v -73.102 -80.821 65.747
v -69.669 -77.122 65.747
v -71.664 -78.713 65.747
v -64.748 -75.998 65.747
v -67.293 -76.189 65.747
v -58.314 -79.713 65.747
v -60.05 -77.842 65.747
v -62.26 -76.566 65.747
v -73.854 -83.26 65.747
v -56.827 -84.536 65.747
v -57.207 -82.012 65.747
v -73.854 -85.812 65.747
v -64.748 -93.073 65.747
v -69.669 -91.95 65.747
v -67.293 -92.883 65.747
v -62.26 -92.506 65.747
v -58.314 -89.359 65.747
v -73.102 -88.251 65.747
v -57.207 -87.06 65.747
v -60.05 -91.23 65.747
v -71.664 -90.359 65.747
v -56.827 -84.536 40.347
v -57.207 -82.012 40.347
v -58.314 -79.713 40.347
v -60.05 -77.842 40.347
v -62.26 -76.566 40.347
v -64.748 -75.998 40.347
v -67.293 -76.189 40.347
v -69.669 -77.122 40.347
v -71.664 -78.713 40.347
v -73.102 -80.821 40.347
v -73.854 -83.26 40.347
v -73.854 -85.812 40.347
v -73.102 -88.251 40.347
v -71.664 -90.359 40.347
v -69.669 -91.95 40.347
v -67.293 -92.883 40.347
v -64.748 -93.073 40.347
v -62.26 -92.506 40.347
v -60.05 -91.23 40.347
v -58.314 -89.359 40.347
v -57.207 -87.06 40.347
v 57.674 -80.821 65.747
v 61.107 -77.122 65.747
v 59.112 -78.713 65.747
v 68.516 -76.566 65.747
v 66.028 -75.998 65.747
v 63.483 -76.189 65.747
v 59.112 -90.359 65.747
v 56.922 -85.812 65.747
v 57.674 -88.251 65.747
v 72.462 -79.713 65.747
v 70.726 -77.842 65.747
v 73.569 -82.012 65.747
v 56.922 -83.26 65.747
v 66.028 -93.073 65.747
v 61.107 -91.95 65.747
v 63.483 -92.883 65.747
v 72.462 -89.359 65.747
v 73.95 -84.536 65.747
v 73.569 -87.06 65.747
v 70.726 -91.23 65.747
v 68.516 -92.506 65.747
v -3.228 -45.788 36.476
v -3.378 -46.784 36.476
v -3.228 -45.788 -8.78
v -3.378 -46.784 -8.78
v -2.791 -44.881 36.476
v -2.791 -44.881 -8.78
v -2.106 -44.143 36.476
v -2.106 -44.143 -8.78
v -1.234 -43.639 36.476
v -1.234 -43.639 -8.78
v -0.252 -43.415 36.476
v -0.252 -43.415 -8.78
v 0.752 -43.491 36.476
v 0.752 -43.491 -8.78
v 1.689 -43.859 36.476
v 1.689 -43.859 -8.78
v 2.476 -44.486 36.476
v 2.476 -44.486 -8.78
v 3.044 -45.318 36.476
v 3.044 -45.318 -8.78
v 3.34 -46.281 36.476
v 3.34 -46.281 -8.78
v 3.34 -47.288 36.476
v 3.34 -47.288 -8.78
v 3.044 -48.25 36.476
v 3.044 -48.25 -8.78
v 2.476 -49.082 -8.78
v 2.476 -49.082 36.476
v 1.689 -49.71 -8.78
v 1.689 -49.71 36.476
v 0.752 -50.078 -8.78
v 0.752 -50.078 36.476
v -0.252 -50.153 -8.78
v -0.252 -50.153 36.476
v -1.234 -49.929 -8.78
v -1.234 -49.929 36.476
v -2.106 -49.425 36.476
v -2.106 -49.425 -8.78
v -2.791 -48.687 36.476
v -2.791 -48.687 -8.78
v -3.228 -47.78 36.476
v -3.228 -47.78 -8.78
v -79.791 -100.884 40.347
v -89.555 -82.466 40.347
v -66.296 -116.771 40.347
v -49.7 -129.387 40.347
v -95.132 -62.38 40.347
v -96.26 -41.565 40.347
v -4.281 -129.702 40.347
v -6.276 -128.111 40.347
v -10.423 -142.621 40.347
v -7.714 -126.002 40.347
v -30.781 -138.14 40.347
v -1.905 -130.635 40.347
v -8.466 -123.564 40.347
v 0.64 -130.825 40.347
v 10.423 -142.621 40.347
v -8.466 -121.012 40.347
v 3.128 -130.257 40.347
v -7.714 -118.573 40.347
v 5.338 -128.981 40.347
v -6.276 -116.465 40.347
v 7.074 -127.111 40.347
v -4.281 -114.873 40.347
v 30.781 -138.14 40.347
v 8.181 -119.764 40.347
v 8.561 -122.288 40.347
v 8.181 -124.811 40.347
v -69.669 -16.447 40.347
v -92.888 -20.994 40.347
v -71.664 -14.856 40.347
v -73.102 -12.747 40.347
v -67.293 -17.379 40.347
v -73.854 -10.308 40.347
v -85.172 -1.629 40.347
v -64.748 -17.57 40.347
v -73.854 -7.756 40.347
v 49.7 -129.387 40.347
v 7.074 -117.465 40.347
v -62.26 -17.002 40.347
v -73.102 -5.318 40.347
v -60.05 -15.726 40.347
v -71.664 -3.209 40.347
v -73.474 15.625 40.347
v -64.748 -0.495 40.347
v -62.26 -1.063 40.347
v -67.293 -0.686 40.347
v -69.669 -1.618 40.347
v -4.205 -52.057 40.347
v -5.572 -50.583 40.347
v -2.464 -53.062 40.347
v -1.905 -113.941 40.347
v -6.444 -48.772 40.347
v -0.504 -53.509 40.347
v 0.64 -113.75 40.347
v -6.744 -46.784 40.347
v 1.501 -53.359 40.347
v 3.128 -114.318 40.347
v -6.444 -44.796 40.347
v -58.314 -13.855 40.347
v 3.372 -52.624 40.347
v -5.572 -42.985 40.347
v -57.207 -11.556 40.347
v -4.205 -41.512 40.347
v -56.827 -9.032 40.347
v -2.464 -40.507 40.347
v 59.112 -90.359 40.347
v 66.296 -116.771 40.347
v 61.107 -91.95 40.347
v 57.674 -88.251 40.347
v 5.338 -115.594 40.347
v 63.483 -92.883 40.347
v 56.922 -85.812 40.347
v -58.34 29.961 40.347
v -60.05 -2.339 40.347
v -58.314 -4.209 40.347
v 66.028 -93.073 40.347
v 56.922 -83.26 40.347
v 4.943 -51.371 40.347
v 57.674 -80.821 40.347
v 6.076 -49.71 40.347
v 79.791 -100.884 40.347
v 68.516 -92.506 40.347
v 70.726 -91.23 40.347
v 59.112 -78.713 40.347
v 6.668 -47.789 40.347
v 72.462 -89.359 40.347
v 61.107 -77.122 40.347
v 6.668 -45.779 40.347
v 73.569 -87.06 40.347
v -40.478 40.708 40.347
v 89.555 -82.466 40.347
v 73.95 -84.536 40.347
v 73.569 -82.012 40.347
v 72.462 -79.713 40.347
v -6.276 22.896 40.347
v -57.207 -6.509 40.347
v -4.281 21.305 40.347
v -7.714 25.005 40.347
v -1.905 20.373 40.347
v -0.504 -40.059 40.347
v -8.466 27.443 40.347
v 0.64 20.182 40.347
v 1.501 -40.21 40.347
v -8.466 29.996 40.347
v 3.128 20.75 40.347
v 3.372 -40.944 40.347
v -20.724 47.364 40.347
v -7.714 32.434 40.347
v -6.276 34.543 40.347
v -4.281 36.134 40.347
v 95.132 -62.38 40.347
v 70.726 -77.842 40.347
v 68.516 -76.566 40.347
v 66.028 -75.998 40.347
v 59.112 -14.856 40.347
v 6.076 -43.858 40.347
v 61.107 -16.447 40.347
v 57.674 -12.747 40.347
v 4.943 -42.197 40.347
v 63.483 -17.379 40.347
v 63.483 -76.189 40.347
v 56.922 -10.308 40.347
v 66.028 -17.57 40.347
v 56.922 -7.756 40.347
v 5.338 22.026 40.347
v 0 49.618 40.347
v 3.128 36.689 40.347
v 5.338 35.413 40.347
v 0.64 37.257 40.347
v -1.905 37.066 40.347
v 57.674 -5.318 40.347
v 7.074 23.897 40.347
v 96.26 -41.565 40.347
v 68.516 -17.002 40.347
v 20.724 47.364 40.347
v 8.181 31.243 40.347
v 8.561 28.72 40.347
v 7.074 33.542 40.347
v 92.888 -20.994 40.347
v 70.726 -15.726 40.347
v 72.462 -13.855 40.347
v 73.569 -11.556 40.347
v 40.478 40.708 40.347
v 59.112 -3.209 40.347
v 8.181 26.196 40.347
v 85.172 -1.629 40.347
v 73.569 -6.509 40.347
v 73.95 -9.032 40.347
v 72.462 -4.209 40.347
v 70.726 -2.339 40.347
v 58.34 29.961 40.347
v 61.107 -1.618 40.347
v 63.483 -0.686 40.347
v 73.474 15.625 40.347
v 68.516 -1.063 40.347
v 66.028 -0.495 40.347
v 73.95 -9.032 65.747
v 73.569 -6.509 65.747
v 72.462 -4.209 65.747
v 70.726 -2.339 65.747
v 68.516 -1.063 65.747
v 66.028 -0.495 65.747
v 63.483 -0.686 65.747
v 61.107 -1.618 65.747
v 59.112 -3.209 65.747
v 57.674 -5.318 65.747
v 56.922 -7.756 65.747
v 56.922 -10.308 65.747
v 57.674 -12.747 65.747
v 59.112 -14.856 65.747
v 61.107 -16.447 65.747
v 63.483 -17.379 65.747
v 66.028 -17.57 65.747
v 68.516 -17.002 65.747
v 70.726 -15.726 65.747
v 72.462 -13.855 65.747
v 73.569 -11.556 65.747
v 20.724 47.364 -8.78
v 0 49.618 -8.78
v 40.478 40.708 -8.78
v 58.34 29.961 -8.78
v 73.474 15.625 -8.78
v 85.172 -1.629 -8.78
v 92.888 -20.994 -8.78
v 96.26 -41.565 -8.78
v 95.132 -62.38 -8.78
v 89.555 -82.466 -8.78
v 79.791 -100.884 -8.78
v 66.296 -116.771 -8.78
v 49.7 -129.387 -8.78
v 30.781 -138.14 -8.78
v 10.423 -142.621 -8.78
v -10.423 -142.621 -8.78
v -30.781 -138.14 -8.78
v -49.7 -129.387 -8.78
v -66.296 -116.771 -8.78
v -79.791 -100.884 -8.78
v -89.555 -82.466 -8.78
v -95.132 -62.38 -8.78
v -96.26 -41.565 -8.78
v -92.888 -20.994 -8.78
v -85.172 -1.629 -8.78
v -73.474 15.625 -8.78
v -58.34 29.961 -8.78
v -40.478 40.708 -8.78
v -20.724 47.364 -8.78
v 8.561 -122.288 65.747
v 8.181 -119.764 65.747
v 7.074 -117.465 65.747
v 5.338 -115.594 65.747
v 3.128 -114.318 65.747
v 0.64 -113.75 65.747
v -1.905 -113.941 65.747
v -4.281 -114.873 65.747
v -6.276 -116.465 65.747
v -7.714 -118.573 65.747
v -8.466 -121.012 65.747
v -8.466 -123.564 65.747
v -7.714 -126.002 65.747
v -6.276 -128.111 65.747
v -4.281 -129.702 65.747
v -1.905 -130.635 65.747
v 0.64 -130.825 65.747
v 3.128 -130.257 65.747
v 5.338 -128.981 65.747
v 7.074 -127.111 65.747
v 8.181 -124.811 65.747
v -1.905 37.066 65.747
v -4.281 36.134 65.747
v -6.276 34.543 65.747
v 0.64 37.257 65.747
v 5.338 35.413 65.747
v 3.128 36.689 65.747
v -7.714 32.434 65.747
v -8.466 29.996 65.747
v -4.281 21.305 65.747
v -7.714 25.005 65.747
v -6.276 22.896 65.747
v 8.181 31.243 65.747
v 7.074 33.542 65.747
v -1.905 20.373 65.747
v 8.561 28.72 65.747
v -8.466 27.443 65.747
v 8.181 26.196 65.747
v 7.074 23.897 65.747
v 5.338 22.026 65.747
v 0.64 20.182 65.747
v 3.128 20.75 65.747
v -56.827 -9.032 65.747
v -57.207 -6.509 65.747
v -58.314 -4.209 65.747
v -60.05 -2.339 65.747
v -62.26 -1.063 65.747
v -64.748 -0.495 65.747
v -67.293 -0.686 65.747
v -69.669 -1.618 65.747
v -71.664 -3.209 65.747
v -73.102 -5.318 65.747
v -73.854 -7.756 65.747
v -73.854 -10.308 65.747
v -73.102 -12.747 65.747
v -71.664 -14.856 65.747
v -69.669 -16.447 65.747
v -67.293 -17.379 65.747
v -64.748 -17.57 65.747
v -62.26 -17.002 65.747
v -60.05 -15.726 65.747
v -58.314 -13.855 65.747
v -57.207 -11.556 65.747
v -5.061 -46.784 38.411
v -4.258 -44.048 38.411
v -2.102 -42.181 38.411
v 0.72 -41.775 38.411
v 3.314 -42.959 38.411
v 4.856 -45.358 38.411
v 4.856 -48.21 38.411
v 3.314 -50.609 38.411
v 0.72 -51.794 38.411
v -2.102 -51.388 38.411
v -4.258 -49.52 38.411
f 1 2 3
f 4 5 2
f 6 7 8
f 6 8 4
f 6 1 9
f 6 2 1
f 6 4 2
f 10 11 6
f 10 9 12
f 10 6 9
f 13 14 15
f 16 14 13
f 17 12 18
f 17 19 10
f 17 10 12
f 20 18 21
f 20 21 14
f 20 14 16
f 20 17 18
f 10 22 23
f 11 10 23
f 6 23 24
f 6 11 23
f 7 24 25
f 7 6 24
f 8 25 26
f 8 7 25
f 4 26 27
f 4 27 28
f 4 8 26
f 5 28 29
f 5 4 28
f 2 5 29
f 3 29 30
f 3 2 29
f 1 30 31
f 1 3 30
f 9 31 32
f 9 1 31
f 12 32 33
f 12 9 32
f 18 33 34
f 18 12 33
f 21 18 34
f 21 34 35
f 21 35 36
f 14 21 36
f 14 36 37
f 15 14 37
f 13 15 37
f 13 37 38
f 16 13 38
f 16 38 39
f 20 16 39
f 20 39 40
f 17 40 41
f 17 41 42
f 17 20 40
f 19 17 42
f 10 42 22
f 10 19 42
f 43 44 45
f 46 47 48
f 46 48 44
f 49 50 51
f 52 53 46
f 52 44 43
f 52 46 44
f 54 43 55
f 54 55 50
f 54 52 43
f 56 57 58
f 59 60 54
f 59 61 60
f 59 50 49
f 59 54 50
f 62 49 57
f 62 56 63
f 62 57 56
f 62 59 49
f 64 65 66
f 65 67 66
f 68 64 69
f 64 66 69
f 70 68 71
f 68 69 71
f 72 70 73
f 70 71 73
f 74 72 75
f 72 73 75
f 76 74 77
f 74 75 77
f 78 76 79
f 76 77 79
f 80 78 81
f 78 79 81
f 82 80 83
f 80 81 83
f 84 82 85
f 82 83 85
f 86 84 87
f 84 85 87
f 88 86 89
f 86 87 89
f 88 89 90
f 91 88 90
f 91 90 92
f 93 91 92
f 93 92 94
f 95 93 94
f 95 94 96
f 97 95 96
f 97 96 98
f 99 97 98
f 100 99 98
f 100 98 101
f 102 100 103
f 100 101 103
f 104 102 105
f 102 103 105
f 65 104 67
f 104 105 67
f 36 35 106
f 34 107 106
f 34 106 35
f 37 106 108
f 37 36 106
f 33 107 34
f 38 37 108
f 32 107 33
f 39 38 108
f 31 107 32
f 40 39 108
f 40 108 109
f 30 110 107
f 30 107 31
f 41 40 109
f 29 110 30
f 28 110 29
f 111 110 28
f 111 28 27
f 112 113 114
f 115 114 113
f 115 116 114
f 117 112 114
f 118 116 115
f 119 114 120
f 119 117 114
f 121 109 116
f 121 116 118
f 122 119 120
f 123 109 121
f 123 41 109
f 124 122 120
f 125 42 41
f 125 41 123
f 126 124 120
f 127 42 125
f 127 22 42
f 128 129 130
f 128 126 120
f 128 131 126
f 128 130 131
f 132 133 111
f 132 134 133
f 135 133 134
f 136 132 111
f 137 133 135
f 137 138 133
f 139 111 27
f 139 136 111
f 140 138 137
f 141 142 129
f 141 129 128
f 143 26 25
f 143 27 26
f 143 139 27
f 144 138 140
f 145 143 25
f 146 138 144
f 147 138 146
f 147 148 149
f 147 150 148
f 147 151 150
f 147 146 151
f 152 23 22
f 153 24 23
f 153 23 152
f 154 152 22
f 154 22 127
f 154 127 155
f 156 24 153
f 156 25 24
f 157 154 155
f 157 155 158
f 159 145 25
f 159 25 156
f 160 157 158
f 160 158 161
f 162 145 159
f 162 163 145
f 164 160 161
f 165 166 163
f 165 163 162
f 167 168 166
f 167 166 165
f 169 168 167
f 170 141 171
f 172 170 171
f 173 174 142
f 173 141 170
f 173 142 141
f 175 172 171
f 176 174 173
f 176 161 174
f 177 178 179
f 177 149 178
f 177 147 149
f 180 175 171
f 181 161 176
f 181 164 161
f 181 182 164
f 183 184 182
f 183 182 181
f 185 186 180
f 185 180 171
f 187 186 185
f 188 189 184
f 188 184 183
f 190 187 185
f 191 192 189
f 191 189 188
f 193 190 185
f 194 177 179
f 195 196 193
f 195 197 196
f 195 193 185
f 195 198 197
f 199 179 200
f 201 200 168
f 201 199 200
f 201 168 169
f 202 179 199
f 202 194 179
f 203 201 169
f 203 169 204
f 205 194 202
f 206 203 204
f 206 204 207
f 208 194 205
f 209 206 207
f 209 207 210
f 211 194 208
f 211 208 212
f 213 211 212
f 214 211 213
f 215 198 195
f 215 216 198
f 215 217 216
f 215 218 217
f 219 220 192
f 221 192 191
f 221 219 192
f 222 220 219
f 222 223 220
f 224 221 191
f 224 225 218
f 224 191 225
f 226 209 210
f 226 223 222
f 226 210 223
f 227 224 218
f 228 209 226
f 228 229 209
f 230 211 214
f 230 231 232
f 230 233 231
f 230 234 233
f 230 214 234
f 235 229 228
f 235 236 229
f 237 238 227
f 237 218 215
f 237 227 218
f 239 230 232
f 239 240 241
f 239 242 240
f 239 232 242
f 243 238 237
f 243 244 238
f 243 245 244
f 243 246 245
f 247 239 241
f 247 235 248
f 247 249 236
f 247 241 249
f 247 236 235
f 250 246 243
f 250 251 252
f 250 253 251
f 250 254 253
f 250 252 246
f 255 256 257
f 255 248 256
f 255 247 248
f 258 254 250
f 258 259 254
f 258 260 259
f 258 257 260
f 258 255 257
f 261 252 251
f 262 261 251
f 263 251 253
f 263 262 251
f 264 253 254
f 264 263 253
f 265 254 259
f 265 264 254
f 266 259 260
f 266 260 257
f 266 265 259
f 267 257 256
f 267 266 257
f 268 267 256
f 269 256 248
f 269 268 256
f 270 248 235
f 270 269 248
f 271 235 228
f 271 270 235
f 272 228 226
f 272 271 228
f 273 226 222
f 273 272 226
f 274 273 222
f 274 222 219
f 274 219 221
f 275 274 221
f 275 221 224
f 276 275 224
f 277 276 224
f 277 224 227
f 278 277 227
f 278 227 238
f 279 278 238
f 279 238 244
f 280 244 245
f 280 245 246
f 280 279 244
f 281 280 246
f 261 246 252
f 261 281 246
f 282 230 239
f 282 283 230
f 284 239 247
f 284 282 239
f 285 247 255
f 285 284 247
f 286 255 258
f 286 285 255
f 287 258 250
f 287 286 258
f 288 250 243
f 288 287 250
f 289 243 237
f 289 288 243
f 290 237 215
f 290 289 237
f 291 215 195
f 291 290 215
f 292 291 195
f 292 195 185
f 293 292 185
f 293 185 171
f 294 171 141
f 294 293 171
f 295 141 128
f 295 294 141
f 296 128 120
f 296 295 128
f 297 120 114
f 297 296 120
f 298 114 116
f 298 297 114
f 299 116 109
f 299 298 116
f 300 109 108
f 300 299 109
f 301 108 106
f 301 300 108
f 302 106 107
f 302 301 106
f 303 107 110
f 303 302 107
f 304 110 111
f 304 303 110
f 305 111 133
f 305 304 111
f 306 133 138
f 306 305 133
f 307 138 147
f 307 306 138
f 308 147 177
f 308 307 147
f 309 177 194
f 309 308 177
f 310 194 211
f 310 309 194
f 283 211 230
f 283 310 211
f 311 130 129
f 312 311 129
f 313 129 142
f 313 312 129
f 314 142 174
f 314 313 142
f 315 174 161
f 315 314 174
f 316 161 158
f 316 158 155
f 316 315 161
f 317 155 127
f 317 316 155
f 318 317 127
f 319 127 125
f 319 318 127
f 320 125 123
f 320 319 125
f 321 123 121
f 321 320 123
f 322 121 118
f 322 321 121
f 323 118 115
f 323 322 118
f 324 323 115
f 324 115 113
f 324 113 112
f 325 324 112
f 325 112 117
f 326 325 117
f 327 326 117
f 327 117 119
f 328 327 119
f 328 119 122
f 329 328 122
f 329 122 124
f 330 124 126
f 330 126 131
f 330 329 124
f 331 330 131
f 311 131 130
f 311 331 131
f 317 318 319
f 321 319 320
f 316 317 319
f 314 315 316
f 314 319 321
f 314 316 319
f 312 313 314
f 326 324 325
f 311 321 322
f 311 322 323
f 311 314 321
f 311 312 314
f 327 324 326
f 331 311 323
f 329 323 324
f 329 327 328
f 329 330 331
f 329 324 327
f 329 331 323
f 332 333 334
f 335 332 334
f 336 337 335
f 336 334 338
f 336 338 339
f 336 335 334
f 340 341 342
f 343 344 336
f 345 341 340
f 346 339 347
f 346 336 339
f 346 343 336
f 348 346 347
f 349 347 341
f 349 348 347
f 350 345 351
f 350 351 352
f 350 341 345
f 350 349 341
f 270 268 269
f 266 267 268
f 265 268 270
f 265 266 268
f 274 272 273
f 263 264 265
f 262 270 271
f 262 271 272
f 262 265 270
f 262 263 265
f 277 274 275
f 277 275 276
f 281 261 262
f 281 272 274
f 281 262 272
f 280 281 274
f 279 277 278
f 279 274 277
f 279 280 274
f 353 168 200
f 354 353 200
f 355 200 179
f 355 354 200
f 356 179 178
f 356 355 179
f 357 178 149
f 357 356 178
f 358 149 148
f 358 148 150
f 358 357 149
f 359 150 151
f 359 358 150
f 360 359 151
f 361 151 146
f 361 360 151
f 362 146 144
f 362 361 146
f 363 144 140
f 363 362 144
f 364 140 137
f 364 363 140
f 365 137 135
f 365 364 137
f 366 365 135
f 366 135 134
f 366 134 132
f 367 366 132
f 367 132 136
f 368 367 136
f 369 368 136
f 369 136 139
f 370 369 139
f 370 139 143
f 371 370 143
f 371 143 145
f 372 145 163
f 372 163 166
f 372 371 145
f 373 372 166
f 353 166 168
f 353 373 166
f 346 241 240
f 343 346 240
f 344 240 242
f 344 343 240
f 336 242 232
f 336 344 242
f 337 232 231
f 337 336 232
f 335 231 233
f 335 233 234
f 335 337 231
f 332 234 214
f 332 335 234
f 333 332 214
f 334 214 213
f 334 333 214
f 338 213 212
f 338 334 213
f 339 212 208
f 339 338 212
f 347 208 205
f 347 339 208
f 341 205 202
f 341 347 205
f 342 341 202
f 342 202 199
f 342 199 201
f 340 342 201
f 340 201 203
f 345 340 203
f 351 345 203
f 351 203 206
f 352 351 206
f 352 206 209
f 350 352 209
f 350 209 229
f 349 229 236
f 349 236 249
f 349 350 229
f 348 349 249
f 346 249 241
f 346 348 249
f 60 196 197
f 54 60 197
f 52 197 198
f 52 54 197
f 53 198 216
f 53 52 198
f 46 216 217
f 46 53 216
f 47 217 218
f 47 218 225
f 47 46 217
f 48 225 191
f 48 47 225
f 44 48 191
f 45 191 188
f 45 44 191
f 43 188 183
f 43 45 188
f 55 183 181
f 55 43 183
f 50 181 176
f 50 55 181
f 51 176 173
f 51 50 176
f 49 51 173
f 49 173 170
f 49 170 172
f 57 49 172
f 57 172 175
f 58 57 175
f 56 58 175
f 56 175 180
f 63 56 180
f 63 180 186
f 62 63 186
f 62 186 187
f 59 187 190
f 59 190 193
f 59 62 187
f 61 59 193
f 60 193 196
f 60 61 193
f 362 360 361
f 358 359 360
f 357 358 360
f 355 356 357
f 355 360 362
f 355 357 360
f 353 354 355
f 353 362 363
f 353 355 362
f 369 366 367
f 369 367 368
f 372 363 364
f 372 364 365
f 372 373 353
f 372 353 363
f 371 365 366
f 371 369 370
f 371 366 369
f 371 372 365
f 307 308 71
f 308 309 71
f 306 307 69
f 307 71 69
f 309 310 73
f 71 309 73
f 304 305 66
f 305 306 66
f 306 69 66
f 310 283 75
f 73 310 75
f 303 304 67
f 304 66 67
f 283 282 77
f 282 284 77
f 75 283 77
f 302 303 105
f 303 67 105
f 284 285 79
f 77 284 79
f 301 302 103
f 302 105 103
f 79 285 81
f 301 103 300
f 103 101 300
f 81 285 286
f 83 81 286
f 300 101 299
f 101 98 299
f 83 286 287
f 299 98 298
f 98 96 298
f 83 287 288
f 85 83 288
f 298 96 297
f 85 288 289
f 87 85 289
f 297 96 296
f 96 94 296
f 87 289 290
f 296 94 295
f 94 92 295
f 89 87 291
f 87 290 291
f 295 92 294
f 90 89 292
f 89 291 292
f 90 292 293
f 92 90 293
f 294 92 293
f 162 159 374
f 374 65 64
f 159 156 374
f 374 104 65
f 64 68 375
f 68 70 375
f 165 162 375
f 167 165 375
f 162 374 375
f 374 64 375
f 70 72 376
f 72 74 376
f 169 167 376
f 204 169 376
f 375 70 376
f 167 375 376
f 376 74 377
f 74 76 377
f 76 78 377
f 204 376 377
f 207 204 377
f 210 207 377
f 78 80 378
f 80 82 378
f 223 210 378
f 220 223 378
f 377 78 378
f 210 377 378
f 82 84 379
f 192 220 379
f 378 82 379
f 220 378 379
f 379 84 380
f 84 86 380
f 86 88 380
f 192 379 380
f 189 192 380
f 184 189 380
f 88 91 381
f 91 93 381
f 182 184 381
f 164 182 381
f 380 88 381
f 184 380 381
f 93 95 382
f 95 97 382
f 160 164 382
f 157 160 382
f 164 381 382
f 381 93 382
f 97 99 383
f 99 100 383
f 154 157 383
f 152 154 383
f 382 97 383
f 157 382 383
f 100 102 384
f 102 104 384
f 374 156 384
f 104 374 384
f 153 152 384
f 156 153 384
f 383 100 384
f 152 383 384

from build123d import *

# Parameters (mm, degrees)
F0_W           = 96.4018628001
F0_H           = 49.1270134225
F2_DEPTH       = 25.4
F3_R           = 96.4018628001
F3_R_2         = 8.561445451
F4_DEPTH       = 25.4
F6_D           = 6.7564
F6_CSINK_D     = 13.4874
F6_CSINK_ANGLE = 82


with BuildPart() as f1:
    # F0 (on Right) → F1 (revolve)
    with BuildSketch(Plane.YZ):
        with Locations((1.4167837799, 15.7836410217)):
            Rectangle(F0_W, F0_H)
    revolve(axis=Axis((0, -46.7841476202, 15.7836410217), (0, 0, -1)))

    # F2 (add): a face of the model
    f2_faces = [f1.faces().sort_by_distance(p)[0] for p in [
        (0, -46.7841476202, 40.347147733),
    ]]
    extrude(f2_faces, amount=F2_DEPTH)

    # F3 (on face) → F4 (cut)
    with BuildSketch(Plane.XY.offset(65.747147733)):
        with Locations((0, -46.7841476202)):
            Circle(F3_R)
        with Locations((-65.3880895687, -84.5359787345)):
            Circle(F3_R_2, mode=Mode.SUBTRACT)
        with Locations((0, -122.2878098488)):
            Circle(F3_R_2, mode=Mode.SUBTRACT)
        with Locations((65.3880895687, -84.5359787345)):
            Circle(F3_R_2, mode=Mode.SUBTRACT)
        with Locations((-65.3880895687, -9.0323165059)):
            Circle(F3_R_2, mode=Mode.SUBTRACT)
        with Locations((65.3880895687, -9.0323165059)):
            Circle(F3_R_2, mode=Mode.SUBTRACT)
        with Locations((0, 28.7195146084)):
            Circle(F3_R_2, mode=Mode.SUBTRACT)
    extrude(amount=-F4_DEPTH, mode=Mode.SUBTRACT)

    # F6 (through all)
    with Locations(Plane.XY.offset(40.347147733)):
        with Locations((0, -46.7841476202)):
            CounterSinkHole(F6_D / 2, F6_CSINK_D / 2, counter_sink_angle=F6_CSINK_ANGLE)


solid = f1.part
